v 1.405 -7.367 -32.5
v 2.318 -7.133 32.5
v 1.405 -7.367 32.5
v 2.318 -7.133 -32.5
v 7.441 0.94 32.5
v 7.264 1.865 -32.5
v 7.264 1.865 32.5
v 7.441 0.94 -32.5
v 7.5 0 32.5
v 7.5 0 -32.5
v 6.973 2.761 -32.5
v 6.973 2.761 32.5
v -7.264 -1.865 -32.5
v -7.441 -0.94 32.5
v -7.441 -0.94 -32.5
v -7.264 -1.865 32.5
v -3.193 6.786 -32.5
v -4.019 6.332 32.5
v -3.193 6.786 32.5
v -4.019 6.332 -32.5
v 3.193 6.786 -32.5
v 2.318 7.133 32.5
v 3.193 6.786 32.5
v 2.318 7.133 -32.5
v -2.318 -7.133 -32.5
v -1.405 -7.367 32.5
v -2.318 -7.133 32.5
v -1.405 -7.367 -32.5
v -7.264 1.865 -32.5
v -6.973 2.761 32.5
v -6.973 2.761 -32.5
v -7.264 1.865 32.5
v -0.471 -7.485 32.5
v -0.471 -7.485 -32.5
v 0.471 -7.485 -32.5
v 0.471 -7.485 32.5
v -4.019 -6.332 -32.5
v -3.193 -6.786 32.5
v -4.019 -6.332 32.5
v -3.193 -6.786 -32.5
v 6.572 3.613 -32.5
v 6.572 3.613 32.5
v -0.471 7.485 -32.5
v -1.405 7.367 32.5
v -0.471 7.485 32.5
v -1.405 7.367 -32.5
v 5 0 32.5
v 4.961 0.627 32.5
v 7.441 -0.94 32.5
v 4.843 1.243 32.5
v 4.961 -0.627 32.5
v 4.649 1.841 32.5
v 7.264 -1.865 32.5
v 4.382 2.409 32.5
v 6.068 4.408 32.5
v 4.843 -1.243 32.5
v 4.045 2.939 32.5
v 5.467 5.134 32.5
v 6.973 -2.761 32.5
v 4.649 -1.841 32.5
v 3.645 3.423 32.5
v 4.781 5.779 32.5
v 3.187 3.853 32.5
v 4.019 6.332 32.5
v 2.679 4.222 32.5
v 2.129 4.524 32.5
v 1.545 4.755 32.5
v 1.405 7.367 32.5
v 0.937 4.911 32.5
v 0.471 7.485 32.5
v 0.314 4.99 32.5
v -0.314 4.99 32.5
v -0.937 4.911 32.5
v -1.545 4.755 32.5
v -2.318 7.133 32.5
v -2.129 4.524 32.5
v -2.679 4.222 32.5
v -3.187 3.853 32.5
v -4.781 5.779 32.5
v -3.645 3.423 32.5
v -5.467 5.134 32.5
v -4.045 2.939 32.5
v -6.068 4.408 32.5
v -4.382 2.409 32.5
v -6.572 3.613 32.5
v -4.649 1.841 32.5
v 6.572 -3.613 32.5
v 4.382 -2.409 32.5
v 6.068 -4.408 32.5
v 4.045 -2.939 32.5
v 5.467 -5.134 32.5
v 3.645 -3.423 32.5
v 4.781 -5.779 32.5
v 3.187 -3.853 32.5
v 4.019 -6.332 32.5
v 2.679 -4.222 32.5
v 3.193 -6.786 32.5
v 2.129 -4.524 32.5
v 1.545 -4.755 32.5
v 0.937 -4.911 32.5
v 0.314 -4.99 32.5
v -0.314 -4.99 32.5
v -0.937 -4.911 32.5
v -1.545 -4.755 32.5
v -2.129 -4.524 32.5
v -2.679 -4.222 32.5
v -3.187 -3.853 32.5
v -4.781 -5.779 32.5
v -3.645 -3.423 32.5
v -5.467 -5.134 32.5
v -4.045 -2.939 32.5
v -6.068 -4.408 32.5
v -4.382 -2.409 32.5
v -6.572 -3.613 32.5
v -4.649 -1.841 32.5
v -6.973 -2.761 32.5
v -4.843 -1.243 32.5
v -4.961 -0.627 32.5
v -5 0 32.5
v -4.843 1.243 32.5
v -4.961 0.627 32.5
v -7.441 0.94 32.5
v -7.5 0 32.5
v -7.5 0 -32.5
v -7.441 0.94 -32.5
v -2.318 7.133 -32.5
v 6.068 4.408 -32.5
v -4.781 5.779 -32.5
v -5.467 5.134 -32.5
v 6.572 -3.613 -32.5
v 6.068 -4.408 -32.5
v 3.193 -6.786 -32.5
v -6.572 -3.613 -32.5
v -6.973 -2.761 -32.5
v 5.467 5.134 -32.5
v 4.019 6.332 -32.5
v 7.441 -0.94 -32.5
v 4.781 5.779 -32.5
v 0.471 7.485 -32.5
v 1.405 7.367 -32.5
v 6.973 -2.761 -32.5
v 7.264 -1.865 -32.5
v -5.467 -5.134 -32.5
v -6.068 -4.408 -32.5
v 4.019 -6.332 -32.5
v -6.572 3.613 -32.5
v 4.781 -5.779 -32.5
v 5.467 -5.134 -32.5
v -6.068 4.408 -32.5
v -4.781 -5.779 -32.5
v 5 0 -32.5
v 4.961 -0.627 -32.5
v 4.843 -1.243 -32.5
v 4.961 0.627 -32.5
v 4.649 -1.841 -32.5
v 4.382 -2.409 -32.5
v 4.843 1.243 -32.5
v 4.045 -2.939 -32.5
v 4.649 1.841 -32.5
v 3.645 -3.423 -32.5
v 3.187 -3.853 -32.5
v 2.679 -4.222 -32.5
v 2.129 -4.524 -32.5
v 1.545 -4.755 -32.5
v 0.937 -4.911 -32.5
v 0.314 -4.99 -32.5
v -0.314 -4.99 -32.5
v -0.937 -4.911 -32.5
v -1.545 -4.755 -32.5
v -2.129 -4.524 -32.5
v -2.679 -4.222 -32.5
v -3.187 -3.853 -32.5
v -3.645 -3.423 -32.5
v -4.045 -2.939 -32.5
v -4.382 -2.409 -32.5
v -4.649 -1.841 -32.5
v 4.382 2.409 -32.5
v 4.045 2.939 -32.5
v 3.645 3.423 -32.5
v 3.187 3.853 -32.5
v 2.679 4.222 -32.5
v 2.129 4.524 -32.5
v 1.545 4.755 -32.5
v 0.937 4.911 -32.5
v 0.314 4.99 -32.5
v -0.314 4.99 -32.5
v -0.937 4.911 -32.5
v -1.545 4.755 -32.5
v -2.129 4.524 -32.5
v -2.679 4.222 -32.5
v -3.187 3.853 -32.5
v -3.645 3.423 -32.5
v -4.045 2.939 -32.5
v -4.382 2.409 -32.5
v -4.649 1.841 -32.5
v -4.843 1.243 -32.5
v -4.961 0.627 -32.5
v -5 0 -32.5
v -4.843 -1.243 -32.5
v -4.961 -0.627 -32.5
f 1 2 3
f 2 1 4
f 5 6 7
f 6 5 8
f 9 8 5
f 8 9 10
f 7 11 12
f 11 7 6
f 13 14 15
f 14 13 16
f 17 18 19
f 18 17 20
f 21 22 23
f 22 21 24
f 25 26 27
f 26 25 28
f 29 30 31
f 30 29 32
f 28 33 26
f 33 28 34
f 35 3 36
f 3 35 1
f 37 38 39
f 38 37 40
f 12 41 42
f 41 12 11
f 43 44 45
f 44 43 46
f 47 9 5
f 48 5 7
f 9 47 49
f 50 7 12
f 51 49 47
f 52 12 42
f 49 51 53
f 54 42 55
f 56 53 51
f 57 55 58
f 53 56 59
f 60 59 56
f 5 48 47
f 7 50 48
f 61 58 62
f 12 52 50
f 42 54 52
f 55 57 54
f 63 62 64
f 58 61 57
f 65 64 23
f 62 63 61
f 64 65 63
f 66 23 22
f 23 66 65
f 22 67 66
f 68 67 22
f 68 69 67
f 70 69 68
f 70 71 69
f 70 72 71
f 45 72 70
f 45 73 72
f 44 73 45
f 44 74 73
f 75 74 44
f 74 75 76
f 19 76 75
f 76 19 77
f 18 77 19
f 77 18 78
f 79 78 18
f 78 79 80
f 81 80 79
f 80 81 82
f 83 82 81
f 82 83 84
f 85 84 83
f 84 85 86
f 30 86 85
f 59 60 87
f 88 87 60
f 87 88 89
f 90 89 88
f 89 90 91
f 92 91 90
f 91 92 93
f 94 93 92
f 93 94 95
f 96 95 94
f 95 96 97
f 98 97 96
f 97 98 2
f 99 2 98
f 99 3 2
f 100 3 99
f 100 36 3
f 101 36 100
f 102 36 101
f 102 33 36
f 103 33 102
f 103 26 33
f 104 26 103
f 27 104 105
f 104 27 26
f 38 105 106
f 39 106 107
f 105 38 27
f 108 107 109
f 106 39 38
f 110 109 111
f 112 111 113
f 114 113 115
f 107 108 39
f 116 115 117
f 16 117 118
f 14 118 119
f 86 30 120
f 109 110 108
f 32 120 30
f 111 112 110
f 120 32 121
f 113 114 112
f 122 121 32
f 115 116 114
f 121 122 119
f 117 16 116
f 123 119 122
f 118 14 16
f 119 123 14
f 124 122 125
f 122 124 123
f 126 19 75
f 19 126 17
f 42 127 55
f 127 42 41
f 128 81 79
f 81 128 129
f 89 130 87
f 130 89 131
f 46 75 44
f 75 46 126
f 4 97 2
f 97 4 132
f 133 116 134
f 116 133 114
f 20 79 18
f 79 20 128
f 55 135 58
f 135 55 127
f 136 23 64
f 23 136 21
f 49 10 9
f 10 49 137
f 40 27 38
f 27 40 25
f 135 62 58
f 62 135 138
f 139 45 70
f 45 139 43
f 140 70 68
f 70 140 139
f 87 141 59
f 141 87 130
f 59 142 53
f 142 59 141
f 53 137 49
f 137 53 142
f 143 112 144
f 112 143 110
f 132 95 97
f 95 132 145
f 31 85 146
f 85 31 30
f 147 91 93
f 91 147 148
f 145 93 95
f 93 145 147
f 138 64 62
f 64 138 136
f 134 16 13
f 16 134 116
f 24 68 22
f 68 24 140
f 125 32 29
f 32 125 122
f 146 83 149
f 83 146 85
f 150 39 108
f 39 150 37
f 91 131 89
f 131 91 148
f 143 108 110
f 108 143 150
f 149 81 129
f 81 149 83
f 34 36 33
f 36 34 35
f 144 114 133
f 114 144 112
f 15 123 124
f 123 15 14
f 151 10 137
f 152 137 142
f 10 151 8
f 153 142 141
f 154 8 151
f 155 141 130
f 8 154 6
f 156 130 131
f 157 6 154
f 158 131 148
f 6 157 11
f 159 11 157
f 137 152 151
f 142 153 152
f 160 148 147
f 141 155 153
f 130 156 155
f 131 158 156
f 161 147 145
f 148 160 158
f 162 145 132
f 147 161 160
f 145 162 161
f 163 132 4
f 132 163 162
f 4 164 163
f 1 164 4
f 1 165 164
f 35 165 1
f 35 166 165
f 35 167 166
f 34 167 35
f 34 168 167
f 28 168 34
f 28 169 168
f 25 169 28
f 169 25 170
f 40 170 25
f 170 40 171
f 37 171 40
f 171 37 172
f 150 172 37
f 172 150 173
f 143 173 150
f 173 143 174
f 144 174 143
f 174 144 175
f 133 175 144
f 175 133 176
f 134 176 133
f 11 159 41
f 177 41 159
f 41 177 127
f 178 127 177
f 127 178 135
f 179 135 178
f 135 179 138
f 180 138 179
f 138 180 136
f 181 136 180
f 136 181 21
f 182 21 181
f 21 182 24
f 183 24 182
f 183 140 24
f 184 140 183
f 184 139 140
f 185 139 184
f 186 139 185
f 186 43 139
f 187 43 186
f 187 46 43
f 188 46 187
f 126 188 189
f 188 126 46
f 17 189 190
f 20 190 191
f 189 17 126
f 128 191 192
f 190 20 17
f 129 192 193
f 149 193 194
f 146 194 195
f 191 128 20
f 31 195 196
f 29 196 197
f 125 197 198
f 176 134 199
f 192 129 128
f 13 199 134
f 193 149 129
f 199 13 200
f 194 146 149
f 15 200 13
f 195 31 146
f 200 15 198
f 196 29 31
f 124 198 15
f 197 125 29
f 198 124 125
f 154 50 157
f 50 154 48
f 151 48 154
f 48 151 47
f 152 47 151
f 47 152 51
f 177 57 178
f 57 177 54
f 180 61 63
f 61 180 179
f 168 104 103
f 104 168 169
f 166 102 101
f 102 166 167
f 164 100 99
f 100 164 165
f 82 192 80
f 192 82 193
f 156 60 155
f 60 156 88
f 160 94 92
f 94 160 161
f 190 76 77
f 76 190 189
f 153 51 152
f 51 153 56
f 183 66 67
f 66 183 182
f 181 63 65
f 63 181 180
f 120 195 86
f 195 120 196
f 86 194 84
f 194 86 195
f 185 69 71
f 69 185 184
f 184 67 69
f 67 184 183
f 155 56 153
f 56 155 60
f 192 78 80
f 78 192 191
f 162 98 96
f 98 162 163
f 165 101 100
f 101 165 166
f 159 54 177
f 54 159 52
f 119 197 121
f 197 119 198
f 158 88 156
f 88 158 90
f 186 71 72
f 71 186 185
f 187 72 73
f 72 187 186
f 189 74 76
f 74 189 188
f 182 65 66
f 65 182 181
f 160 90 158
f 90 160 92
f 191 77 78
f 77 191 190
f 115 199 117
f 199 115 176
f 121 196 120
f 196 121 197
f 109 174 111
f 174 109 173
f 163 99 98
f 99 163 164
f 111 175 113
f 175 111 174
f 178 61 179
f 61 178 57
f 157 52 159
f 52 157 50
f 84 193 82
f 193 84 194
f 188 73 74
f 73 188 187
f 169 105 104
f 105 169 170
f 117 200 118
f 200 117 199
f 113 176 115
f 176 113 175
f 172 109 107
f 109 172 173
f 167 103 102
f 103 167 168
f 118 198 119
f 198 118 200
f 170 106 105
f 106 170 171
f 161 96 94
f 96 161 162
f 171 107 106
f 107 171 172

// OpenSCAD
$fn = 50;


difference() {
	union() {
		translate(v = [0, 0, -32.5000000000]) {
			cylinder(h = 65, r = 7.5000000000);
		}
	}
	union() {
		translate(v = [0, 0, -100.0000000000]) {
			cylinder(h = 200, r = 5.0000000000);
		}
	}
}
